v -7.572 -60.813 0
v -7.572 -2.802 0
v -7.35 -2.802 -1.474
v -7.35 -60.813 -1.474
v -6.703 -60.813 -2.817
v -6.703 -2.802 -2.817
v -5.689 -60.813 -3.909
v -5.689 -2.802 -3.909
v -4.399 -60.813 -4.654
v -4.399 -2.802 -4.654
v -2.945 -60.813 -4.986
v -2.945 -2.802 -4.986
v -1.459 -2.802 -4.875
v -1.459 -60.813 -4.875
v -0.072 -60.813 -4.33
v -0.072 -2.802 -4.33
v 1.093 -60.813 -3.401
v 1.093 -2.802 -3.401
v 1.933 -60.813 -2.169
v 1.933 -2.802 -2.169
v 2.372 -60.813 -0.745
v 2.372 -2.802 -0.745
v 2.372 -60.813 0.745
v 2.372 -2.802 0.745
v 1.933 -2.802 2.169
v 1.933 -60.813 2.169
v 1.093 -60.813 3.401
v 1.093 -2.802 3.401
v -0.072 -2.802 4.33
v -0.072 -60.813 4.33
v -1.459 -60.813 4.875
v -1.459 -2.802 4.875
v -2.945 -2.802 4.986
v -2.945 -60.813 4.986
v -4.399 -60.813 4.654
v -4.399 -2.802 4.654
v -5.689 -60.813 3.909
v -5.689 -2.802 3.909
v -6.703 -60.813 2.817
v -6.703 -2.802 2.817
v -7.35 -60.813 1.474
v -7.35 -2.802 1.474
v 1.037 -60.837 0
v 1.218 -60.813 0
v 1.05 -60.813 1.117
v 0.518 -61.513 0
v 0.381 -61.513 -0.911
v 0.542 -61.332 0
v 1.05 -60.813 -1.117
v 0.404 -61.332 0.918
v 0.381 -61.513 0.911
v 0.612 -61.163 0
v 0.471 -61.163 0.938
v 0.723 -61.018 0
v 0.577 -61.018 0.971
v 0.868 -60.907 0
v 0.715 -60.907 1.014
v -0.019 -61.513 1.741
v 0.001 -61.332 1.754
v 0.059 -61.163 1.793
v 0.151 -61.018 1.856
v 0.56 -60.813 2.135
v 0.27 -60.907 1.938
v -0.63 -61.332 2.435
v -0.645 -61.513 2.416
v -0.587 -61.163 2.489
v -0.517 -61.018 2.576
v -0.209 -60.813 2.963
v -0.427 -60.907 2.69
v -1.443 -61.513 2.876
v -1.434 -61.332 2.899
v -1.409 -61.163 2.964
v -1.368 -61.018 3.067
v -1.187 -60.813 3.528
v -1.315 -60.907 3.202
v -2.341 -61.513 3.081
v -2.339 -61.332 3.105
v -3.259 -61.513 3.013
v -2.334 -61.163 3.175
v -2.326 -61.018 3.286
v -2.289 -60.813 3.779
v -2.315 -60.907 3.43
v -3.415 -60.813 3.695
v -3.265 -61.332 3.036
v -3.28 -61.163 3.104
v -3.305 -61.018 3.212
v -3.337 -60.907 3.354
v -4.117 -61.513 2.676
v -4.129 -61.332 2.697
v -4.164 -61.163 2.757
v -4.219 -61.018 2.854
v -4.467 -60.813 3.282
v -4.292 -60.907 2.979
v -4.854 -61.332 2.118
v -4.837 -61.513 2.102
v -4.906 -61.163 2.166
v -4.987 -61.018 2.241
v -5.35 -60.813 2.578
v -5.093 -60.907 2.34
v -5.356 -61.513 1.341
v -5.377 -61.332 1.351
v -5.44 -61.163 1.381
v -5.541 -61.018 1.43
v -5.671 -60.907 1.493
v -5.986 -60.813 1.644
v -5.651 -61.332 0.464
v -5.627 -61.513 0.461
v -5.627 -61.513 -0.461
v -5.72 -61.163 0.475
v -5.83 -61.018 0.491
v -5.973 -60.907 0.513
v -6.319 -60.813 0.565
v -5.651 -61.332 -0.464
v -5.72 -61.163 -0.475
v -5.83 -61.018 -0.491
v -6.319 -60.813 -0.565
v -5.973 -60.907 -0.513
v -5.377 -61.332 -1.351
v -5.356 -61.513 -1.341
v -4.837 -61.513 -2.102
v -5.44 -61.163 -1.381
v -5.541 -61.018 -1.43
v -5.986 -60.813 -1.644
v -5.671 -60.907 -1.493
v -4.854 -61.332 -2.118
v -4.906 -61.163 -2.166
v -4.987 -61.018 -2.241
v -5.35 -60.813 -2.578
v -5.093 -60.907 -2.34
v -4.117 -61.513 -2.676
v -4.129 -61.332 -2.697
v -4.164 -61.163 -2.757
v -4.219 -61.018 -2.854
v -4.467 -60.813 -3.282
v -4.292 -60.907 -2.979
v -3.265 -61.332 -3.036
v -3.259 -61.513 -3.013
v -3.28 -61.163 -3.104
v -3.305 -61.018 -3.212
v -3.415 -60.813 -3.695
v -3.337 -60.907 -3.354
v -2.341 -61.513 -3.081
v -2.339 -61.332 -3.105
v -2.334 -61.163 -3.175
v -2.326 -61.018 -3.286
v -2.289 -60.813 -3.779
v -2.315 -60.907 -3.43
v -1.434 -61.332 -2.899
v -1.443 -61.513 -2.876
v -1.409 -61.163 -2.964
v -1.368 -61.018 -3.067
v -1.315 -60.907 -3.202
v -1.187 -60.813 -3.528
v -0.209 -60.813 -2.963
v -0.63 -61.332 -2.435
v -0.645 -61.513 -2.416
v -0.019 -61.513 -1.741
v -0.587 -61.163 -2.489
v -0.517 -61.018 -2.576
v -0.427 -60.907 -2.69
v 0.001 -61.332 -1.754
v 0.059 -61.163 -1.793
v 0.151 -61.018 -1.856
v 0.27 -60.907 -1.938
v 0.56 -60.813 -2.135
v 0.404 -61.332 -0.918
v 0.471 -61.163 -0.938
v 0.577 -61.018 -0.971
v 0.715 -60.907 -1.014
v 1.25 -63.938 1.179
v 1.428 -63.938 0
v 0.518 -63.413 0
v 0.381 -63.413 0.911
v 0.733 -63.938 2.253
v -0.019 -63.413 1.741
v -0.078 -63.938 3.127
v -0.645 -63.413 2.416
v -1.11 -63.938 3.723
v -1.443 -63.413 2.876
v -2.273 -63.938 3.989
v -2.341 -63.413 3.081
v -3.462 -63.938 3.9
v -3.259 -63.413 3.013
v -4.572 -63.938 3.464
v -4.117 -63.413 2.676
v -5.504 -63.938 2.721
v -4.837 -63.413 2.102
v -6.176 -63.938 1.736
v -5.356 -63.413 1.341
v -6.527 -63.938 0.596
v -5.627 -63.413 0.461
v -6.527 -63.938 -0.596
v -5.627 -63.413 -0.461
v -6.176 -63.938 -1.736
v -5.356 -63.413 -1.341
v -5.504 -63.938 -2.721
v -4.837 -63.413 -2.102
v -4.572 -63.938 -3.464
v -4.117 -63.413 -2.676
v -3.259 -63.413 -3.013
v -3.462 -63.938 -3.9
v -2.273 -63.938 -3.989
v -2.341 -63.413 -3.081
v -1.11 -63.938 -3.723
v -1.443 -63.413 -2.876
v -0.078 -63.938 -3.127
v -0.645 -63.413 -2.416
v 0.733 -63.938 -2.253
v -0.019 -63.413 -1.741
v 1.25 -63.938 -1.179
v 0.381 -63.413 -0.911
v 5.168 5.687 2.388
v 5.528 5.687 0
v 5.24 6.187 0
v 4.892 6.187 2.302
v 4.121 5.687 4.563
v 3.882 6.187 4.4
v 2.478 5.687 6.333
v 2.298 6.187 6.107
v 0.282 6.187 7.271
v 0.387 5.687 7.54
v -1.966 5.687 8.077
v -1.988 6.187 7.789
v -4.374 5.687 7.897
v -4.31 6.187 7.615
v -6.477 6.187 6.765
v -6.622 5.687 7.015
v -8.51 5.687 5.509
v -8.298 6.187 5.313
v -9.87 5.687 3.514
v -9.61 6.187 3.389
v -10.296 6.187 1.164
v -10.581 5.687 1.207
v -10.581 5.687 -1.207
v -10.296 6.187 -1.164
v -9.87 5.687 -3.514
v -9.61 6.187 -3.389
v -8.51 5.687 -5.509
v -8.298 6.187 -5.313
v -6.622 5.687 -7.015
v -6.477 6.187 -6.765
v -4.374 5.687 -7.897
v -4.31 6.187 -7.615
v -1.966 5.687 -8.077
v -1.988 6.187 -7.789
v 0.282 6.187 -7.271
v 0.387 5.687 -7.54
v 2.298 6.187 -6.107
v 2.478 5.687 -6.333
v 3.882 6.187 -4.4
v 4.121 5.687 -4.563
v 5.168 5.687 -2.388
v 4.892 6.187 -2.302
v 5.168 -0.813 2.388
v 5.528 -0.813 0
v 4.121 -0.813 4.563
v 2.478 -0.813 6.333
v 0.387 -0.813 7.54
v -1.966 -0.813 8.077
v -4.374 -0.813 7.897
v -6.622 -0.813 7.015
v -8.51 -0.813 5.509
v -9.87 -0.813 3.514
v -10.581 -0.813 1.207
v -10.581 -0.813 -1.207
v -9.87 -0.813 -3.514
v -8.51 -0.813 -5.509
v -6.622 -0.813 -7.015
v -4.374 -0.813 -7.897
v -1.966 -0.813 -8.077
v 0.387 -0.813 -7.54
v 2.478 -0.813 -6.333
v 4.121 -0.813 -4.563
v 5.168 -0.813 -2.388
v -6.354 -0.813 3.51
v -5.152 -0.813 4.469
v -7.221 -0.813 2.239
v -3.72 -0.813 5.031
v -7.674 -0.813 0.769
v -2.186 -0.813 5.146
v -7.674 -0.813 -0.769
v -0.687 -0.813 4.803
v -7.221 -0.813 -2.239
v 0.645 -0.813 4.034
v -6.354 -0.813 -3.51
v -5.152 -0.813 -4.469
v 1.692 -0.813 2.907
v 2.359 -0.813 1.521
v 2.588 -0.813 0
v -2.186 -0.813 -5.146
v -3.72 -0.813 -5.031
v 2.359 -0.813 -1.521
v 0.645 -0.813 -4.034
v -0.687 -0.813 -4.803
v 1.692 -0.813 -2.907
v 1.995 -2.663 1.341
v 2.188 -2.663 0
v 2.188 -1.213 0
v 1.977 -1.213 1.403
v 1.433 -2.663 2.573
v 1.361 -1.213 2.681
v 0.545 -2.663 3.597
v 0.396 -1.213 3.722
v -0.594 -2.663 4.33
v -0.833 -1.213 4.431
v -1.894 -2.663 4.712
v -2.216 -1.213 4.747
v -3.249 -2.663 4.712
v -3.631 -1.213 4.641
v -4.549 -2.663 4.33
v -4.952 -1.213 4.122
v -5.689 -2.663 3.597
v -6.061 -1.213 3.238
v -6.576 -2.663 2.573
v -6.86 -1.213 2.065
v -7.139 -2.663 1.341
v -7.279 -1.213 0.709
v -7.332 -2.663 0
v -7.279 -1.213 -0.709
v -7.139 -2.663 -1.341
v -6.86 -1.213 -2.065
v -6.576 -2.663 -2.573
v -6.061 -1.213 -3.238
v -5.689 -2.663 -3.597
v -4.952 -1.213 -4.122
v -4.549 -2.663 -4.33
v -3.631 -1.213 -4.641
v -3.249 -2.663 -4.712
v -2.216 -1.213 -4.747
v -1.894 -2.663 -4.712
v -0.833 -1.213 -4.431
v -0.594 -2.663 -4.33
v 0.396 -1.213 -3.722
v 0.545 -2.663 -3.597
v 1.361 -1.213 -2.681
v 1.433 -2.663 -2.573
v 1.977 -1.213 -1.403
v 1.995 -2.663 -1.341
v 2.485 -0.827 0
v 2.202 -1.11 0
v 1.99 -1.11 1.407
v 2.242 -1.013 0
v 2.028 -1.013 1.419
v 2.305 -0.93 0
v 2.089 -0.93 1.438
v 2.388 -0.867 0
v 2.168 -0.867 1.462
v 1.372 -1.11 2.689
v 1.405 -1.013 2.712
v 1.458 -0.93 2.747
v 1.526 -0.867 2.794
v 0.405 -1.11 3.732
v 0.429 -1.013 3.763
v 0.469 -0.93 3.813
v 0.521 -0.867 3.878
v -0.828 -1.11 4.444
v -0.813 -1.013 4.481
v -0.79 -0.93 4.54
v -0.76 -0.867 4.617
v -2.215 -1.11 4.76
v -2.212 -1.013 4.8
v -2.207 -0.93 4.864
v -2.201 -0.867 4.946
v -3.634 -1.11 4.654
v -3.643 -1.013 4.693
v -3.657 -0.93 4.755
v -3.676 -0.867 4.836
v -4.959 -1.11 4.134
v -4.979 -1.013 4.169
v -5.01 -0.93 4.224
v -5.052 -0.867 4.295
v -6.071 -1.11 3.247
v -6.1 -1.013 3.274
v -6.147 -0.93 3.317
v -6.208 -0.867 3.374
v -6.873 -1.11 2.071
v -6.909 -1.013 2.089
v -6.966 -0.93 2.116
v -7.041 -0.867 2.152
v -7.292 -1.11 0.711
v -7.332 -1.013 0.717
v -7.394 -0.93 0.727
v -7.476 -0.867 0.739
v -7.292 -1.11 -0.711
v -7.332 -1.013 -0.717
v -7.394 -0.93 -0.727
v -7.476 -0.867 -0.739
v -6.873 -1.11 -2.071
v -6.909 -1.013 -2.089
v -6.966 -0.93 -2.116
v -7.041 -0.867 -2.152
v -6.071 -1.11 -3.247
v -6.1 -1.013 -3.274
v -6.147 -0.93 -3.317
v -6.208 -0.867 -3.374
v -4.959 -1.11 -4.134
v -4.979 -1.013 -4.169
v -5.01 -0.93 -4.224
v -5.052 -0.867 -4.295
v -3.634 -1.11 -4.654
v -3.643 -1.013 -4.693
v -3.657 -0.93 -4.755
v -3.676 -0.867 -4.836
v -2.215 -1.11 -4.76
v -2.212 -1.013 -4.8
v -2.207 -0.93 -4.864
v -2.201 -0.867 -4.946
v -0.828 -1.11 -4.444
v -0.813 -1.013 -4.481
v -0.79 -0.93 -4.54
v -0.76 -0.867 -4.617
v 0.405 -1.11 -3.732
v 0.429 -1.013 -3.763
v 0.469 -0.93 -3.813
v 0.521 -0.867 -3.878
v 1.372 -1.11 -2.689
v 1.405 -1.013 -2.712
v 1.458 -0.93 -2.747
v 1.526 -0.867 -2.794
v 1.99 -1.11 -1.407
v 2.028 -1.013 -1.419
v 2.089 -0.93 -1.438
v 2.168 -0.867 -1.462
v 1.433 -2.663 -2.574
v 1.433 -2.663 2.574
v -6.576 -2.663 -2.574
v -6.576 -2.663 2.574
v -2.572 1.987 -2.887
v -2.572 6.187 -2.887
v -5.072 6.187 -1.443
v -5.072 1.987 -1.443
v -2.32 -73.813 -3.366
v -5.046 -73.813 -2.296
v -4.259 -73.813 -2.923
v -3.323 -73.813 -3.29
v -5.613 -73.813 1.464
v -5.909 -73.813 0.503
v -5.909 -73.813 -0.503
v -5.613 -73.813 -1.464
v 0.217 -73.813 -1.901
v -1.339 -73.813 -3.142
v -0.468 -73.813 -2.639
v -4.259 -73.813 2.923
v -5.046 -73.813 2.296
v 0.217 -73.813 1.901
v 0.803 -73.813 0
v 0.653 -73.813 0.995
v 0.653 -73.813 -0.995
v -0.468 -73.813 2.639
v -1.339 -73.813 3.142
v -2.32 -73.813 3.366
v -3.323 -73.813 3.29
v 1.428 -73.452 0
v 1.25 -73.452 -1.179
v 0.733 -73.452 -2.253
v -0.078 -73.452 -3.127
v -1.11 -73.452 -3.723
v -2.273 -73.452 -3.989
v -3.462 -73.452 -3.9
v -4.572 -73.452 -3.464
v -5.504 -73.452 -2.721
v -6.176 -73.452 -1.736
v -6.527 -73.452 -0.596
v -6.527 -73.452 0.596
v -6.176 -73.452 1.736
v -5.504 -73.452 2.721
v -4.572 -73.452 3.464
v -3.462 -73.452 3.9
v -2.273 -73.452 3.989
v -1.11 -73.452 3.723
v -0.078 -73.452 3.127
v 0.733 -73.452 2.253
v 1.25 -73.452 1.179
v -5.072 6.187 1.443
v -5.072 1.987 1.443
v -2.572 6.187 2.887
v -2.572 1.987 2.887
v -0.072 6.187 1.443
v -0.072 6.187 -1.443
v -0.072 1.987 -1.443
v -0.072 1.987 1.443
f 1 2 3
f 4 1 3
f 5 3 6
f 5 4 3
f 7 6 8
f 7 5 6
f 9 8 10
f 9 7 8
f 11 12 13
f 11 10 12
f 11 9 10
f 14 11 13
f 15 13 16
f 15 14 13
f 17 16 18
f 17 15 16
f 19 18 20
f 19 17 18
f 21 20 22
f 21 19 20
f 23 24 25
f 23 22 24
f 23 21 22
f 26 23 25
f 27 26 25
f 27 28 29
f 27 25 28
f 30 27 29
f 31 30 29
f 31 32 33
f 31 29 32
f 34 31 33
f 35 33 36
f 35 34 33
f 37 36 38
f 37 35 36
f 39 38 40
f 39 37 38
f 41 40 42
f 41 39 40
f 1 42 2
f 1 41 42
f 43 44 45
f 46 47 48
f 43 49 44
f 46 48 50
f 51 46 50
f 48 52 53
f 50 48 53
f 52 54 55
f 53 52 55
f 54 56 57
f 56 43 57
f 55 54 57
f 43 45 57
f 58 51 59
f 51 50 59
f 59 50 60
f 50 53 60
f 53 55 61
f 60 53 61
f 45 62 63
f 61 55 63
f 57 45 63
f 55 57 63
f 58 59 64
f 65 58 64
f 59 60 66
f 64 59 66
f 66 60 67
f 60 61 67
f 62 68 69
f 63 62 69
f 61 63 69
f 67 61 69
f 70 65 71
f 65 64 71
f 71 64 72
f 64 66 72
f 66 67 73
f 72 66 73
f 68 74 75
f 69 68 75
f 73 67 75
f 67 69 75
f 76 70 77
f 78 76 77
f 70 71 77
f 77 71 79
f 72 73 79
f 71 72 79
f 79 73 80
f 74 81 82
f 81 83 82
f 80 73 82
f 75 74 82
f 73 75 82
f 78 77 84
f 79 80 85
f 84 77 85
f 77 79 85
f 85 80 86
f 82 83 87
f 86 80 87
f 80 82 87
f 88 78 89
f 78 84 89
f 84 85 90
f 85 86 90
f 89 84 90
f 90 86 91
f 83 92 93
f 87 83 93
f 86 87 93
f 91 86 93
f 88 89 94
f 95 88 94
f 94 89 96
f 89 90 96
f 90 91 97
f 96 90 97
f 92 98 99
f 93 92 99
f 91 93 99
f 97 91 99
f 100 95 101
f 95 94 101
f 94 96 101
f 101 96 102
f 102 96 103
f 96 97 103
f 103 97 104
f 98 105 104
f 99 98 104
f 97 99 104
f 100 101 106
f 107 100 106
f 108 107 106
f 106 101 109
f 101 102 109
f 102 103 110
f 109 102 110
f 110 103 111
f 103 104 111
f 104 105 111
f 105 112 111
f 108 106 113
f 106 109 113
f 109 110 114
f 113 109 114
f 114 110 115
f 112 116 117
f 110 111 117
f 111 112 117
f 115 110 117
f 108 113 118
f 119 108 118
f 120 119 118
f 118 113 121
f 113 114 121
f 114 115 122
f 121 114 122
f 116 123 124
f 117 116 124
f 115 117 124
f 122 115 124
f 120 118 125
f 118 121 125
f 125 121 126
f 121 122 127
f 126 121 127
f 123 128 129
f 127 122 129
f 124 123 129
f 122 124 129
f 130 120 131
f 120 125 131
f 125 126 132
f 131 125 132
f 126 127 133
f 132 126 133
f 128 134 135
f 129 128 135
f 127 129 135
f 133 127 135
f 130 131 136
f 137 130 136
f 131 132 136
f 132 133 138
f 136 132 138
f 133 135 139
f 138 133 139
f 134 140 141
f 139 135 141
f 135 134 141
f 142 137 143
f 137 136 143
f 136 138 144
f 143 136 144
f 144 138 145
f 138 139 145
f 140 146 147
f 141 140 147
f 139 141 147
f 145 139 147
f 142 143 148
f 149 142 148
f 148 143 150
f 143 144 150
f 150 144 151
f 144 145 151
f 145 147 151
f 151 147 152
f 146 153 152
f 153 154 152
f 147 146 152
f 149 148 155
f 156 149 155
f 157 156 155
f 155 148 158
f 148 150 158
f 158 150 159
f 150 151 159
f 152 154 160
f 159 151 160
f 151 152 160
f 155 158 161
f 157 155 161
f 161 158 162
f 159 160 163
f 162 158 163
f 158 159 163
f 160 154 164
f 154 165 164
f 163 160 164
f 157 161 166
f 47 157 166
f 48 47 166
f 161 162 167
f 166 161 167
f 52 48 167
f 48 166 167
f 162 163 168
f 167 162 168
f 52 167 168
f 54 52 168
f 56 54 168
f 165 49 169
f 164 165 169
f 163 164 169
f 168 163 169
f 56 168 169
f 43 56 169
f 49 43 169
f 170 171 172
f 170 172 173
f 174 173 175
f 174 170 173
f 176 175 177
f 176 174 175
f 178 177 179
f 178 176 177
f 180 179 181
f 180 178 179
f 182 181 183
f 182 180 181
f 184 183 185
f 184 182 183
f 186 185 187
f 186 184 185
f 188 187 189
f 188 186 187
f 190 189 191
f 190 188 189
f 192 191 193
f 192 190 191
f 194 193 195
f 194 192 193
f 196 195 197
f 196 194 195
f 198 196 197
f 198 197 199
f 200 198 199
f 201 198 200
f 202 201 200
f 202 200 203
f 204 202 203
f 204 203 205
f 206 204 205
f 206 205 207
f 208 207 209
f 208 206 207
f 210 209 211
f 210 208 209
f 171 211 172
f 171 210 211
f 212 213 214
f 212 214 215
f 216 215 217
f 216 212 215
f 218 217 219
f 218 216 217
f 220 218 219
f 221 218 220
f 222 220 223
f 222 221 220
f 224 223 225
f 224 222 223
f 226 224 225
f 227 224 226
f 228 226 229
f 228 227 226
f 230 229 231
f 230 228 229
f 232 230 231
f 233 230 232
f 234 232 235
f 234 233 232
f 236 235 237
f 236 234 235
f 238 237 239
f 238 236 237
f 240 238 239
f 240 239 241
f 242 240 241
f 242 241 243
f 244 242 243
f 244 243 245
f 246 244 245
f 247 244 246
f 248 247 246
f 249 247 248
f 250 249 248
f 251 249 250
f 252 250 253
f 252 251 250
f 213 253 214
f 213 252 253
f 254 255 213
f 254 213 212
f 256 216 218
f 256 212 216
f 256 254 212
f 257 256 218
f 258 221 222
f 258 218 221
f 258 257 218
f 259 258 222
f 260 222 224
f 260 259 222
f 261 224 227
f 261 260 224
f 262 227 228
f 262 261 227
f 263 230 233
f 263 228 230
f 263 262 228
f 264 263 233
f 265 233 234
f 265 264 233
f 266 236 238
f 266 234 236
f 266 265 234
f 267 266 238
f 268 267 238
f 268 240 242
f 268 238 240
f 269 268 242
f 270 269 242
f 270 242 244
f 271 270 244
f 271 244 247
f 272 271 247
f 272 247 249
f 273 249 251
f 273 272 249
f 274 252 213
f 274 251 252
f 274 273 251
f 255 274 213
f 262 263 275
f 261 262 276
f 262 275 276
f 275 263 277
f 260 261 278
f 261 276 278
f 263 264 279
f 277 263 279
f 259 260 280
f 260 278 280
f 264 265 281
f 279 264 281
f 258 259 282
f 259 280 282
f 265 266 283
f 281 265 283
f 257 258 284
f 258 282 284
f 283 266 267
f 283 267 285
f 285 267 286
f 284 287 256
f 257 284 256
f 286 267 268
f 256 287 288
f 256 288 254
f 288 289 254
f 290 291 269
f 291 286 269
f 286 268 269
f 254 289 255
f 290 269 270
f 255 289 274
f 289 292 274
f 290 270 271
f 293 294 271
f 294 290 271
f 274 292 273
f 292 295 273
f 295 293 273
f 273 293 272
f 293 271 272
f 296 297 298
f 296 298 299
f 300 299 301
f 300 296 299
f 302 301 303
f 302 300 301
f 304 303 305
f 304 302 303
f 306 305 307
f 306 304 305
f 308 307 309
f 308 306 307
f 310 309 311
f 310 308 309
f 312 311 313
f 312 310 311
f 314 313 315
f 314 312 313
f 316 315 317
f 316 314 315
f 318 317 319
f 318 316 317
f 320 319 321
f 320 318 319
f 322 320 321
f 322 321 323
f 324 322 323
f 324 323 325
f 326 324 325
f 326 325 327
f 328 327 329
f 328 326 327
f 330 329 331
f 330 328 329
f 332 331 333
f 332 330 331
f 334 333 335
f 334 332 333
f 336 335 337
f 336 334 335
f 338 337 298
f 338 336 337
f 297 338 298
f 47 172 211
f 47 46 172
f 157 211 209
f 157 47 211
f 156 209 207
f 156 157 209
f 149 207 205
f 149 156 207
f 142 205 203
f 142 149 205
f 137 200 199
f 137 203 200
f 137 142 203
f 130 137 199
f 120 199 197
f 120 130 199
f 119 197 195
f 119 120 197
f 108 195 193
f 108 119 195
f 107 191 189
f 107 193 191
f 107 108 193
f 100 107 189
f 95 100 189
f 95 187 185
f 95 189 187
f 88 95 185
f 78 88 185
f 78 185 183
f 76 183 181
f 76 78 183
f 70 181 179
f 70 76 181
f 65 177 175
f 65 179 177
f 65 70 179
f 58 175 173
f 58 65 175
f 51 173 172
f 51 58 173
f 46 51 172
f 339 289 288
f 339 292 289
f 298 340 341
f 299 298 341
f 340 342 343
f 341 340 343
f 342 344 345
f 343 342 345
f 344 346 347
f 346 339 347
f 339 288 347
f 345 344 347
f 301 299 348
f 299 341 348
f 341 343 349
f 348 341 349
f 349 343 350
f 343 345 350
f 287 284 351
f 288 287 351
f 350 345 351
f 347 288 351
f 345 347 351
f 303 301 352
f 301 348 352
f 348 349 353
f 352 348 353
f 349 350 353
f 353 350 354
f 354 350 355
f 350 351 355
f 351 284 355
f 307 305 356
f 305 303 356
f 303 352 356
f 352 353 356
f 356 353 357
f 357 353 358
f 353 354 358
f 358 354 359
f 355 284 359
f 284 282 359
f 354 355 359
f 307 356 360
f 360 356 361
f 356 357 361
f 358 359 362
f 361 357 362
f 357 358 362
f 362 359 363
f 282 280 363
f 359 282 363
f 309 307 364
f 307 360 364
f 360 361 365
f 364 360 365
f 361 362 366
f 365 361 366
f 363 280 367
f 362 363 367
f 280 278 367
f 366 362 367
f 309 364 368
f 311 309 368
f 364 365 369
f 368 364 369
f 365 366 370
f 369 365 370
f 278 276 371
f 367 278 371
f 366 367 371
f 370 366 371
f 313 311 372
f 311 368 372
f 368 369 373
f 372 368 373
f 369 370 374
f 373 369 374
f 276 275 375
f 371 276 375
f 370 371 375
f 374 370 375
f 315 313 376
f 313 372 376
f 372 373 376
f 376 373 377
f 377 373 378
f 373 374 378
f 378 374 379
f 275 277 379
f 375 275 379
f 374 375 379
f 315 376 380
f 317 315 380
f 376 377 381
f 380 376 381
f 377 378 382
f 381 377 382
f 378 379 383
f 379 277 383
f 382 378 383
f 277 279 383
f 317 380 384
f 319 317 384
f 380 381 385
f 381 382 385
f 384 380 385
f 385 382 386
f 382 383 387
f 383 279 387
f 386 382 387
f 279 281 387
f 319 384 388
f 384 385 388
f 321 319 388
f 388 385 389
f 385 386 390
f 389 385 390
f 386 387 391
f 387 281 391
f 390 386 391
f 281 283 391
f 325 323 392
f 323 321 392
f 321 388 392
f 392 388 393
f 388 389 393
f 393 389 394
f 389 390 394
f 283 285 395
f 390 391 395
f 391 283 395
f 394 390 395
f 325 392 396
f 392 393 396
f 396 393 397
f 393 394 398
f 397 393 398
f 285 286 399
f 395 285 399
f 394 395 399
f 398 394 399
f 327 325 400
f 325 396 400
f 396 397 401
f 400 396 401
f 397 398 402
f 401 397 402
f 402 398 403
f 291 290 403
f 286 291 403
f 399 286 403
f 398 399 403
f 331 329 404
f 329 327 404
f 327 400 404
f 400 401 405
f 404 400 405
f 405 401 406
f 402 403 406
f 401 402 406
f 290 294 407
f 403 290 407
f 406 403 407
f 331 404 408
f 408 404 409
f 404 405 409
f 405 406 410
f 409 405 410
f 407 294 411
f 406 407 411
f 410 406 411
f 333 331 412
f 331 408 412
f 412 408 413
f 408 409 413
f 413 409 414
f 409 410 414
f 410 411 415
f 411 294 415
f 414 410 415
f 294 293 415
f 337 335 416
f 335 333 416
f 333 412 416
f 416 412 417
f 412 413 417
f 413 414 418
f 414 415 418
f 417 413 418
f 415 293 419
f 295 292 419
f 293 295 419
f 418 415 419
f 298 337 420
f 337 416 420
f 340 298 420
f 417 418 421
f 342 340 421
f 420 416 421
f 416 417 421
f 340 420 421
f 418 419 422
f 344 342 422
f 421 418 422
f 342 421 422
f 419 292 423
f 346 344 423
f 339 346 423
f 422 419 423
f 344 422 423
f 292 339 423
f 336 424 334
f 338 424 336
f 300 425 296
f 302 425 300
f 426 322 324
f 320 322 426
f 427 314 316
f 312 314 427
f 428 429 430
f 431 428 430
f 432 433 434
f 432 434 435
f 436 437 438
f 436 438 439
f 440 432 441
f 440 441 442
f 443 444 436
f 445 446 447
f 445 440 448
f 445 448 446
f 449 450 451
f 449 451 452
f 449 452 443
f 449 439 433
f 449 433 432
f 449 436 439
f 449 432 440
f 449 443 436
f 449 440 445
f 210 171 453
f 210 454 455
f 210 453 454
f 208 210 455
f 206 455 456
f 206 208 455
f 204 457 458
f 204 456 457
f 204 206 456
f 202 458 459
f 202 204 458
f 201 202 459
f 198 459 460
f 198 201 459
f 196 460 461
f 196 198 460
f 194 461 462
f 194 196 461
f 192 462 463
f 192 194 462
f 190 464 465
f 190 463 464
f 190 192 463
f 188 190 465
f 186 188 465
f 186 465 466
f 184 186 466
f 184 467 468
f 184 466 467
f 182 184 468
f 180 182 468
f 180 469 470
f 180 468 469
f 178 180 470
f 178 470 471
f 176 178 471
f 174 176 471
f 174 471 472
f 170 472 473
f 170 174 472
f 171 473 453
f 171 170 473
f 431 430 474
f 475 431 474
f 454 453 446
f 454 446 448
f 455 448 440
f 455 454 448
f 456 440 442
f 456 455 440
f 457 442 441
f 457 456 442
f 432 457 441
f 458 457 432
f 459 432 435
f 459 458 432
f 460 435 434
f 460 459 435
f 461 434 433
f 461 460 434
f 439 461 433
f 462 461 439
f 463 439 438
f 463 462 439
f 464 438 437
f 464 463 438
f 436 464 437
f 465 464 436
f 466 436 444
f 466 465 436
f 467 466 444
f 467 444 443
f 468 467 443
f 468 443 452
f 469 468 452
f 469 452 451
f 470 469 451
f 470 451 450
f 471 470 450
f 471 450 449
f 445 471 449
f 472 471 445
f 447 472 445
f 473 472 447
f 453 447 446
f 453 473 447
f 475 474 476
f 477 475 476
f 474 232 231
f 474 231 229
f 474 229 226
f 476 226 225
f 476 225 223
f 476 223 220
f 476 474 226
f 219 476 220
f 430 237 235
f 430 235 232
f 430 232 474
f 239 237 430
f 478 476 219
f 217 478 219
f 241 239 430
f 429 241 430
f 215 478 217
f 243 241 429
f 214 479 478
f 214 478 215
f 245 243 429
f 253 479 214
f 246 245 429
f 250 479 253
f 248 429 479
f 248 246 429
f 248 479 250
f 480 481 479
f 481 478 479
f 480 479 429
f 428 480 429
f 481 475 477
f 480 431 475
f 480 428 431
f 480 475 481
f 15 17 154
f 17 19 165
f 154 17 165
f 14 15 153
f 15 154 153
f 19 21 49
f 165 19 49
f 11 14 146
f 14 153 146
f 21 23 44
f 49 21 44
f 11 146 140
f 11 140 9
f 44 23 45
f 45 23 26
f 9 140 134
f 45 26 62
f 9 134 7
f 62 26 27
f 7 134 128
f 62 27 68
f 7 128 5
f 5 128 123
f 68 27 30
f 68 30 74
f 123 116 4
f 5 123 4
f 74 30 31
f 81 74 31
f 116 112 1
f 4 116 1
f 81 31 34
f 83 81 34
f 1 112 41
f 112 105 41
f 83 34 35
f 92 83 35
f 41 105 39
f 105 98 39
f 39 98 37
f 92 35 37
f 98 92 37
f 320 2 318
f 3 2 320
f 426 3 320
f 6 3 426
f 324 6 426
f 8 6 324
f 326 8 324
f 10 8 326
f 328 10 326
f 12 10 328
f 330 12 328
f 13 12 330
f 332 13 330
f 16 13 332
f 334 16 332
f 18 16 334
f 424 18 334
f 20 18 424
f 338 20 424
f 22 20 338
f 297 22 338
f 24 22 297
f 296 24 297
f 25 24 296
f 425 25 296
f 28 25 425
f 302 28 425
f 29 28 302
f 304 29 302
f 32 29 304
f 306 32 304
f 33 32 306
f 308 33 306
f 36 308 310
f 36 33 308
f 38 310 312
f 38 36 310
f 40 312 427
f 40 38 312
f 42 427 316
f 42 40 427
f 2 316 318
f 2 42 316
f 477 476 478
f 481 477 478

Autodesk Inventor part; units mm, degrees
ref_plane "YZ Plane" through (0, 0, 0) normal (1, 0, 0) x (0, 1, 0)
ref_plane "XZ Plane" through (0, 0, 0) normal (0, 1, 0) x (-1, 0, 0)
ref_plane "XY Plane" through (0, 0, 0) normal (0, 0, 1) x (1, 0, 0)
sketch "Sketch1" plane through (0, 0, 0) normal (0, 0, 1) x (1, 0, 0)
  line L0 (-2.5718, -2.6632) -> (-7.5718, -2.6632)
  line L1 (-7.5718, -2.6632) -> (-7.5718, -60.8132)
  line L2 (-7.5718, -60.8132) -> (-2.5718, -60.8132)
  line L3 (-2.5718, -60.8132) -> (-2.5718, -2.6632)
  dimension "d1" = 58.15
  dimension "d2" = 5
revolve "Shoulder" add sketch "Sketch1" angle 360 about axis through (-2.5718, -60.8132, 0) along (0, 1, 0)
sketch "Sketch2" plane through (-2.5718, -2.6632, 0) normal (0, 1, 0) x (1, 0, 0)
  circle A0 centre (0, 0) radius 5 projected
  circle A1 centre (0, 0) radius 4.76
  dimension "d3" = 9.52
extrude "Shoulder_neck" add sketch "Sketch2" along normal blind 1.85 contours A1
sketch "Sketch3" plane through (-2.5718, -0.8132, 0) normal (0, 1, 0) x (1, 0, 0)
  circle A0 centre (0, 0) radius 4.76 projected
  circle A1 centre (0, 0) radius 8.1
  dimension "d6" = 16.2
extrude "Head" add sketch "Sketch3" along normal blind 7 contours A0 | A1
sketch "Sketch4" plane through (-2.5718, -60.8132, 0) normal (0, -1, 0) x (1, 0, 0)
  circle A0 centre (0, 0) radius 5 projected
  circle A1 centre (0, 0) radius 3.09
  dimension "d9" = 6.18
extrude "Thread_neck" add sketch "Sketch4" along normal blind 2.6 contours A1
sketch "Sketch5" plane through (-2.5718, -63.4132, 0) normal (0, -1, 0) x (1, 0, 0)
  circle A0 centre (0, 0) radius 3.09 projected
  circle A1 centre (0, 0) radius 4
  dimension "d12" = 8
extrude "Thread_shoulder" add sketch "Sketch5" along normal blind 10.4 contours A0 | A1
sketch "Sketch6" plane through (-2.5718, 6.1868, 0) normal (0, 1, 0) x (1, 0, 0)
  circle A0 centre (0, 0) radius 8.1 projected
  circle A1 centre (0, 0) radius 2.5 construction
  line L0 (-2.5, 1.4434) -> (-2.5, -1.4434)
  line L1 (-2.5, -1.4434) -> (0, -2.8868)
  line L2 (0, -2.8868) -> (2.5, -1.4434)
  line L3 (2.5, -1.4434) -> (2.5, 1.4434)
  line L4 (2.5, 1.4434) -> (0, 2.8868)
  line L5 (0, 2.8868) -> (-2.5, 1.4434)
  dimension "d15" = 5
extrude "Hex" cut sketch "Sketch6" against normal blind 4.2 contours L5 L4 L3 L2 L1 L0
chamfer "Chamfer1" distance 0.24 angle 30 1 edges at (2.4282, -2.6632, 0) measured on face at (-7.3973, -2.6632, -0.7786)
fillet "Fillet1" radius 0.4 1 edges at (-7.3318, -0.8132, 0)
chamfer "Chamfer2" distance 0.5 angle 30 1 edges at (-10.6718, 6.1868, 0) measured on face at (5.4233, 3.8535, 1.2993)
chamfer "Chamfer3" distance 0.625 angle 30 1 edges at (-6.5718, -73.8132, 0) measured on face at (-1.8144, -73.8132, 1.0973)
fillet "Fillet2" radius 0.7 1 edges at (-5.6618, -60.8132, 0)
chamfer "Chamfer7" distance 0.91 angle 30 1 edges at (-6.5718, -63.4132, 0) measured on face at (1.0861, -63.4132, -0.3191)
thread "Thread" size "M8x1.25" class "6g" standard "ANSI Metric M Profile" full length
equation "\"d1\" = Shoulder_length - Shoulder_neck_length"
equation "\"d2\" = 0.5 * Shoulder_diameter"
equation "\"d3\" = Shoulder_neck_dia"
equation "\"d4\" = Shoulder_neck_length"
equation "\"d6\" = Head_diameter"
equation "\"d7\" = Head_height"
equation "\"d9\" = Thread_neck_dia"
equation "\"d10\" = Thread_neck_length"
equation "\"d12\" = Thread_diameter"
equation "\"d13\" = Thread_length - Thread_neck_length"
equation "\"d15\" = Hex_size"
equation "\"d16\" = Hex_length"
equation "\"d18\" = -0.5 * Shoulder_neck_dia + 0.5 * Shoulder_diameter"
equation "\"d64\" = -0.5 * Shoulder_neck_dia + 0.5 * Shoulder_diameter"
equation "\"d21\" = 0.1 * Hex_size"
equation "\"d65\" = 0.1 * Hex_size"
equation "\"d23\" = 0.5 * Thread_pitch"
equation "\"d66\" = 0.5 * Thread_pitch"
equation "\"d25\" = Thread_neck_radius"
equation "\"d60\" = -0.5 * Thread_neck_dia + 0.5 * Thread_diameter"
equation "\"d67\" = -0.5 * Thread_neck_dia + 0.5 * Thread_diameter"
equation "\"Shoulder_length\" = 60"
equation "\"Shoulder_neck_dia\" = 9.52"
equation "\"Thread_diameter\" = 8"
equation "\"Thread_length\" = 13"
equation "\"Head_diameter\" = 16.2"
equation "\"Head_height\" = 7"
equation "\"Thread_neck_dia\" = 6.18"
equation "\"Hex_size\" = 5"
equation "\"Hex_length\" = 4.2"
equation "\"Thread_pitch\" = 1.25"
equation "\"Shoulder_neck_length\" = 1.85"
equation "\"Thread_neck_length\" = 2.6"
equation "\"Thread_neck_radius\" = 0.7"
equation "\"Shoulder_diameter\" = 10"
properties part number "SCREW, SHOULDER, P, 12.9, 10X60" material "Steel, High Strength Low Alloy"
